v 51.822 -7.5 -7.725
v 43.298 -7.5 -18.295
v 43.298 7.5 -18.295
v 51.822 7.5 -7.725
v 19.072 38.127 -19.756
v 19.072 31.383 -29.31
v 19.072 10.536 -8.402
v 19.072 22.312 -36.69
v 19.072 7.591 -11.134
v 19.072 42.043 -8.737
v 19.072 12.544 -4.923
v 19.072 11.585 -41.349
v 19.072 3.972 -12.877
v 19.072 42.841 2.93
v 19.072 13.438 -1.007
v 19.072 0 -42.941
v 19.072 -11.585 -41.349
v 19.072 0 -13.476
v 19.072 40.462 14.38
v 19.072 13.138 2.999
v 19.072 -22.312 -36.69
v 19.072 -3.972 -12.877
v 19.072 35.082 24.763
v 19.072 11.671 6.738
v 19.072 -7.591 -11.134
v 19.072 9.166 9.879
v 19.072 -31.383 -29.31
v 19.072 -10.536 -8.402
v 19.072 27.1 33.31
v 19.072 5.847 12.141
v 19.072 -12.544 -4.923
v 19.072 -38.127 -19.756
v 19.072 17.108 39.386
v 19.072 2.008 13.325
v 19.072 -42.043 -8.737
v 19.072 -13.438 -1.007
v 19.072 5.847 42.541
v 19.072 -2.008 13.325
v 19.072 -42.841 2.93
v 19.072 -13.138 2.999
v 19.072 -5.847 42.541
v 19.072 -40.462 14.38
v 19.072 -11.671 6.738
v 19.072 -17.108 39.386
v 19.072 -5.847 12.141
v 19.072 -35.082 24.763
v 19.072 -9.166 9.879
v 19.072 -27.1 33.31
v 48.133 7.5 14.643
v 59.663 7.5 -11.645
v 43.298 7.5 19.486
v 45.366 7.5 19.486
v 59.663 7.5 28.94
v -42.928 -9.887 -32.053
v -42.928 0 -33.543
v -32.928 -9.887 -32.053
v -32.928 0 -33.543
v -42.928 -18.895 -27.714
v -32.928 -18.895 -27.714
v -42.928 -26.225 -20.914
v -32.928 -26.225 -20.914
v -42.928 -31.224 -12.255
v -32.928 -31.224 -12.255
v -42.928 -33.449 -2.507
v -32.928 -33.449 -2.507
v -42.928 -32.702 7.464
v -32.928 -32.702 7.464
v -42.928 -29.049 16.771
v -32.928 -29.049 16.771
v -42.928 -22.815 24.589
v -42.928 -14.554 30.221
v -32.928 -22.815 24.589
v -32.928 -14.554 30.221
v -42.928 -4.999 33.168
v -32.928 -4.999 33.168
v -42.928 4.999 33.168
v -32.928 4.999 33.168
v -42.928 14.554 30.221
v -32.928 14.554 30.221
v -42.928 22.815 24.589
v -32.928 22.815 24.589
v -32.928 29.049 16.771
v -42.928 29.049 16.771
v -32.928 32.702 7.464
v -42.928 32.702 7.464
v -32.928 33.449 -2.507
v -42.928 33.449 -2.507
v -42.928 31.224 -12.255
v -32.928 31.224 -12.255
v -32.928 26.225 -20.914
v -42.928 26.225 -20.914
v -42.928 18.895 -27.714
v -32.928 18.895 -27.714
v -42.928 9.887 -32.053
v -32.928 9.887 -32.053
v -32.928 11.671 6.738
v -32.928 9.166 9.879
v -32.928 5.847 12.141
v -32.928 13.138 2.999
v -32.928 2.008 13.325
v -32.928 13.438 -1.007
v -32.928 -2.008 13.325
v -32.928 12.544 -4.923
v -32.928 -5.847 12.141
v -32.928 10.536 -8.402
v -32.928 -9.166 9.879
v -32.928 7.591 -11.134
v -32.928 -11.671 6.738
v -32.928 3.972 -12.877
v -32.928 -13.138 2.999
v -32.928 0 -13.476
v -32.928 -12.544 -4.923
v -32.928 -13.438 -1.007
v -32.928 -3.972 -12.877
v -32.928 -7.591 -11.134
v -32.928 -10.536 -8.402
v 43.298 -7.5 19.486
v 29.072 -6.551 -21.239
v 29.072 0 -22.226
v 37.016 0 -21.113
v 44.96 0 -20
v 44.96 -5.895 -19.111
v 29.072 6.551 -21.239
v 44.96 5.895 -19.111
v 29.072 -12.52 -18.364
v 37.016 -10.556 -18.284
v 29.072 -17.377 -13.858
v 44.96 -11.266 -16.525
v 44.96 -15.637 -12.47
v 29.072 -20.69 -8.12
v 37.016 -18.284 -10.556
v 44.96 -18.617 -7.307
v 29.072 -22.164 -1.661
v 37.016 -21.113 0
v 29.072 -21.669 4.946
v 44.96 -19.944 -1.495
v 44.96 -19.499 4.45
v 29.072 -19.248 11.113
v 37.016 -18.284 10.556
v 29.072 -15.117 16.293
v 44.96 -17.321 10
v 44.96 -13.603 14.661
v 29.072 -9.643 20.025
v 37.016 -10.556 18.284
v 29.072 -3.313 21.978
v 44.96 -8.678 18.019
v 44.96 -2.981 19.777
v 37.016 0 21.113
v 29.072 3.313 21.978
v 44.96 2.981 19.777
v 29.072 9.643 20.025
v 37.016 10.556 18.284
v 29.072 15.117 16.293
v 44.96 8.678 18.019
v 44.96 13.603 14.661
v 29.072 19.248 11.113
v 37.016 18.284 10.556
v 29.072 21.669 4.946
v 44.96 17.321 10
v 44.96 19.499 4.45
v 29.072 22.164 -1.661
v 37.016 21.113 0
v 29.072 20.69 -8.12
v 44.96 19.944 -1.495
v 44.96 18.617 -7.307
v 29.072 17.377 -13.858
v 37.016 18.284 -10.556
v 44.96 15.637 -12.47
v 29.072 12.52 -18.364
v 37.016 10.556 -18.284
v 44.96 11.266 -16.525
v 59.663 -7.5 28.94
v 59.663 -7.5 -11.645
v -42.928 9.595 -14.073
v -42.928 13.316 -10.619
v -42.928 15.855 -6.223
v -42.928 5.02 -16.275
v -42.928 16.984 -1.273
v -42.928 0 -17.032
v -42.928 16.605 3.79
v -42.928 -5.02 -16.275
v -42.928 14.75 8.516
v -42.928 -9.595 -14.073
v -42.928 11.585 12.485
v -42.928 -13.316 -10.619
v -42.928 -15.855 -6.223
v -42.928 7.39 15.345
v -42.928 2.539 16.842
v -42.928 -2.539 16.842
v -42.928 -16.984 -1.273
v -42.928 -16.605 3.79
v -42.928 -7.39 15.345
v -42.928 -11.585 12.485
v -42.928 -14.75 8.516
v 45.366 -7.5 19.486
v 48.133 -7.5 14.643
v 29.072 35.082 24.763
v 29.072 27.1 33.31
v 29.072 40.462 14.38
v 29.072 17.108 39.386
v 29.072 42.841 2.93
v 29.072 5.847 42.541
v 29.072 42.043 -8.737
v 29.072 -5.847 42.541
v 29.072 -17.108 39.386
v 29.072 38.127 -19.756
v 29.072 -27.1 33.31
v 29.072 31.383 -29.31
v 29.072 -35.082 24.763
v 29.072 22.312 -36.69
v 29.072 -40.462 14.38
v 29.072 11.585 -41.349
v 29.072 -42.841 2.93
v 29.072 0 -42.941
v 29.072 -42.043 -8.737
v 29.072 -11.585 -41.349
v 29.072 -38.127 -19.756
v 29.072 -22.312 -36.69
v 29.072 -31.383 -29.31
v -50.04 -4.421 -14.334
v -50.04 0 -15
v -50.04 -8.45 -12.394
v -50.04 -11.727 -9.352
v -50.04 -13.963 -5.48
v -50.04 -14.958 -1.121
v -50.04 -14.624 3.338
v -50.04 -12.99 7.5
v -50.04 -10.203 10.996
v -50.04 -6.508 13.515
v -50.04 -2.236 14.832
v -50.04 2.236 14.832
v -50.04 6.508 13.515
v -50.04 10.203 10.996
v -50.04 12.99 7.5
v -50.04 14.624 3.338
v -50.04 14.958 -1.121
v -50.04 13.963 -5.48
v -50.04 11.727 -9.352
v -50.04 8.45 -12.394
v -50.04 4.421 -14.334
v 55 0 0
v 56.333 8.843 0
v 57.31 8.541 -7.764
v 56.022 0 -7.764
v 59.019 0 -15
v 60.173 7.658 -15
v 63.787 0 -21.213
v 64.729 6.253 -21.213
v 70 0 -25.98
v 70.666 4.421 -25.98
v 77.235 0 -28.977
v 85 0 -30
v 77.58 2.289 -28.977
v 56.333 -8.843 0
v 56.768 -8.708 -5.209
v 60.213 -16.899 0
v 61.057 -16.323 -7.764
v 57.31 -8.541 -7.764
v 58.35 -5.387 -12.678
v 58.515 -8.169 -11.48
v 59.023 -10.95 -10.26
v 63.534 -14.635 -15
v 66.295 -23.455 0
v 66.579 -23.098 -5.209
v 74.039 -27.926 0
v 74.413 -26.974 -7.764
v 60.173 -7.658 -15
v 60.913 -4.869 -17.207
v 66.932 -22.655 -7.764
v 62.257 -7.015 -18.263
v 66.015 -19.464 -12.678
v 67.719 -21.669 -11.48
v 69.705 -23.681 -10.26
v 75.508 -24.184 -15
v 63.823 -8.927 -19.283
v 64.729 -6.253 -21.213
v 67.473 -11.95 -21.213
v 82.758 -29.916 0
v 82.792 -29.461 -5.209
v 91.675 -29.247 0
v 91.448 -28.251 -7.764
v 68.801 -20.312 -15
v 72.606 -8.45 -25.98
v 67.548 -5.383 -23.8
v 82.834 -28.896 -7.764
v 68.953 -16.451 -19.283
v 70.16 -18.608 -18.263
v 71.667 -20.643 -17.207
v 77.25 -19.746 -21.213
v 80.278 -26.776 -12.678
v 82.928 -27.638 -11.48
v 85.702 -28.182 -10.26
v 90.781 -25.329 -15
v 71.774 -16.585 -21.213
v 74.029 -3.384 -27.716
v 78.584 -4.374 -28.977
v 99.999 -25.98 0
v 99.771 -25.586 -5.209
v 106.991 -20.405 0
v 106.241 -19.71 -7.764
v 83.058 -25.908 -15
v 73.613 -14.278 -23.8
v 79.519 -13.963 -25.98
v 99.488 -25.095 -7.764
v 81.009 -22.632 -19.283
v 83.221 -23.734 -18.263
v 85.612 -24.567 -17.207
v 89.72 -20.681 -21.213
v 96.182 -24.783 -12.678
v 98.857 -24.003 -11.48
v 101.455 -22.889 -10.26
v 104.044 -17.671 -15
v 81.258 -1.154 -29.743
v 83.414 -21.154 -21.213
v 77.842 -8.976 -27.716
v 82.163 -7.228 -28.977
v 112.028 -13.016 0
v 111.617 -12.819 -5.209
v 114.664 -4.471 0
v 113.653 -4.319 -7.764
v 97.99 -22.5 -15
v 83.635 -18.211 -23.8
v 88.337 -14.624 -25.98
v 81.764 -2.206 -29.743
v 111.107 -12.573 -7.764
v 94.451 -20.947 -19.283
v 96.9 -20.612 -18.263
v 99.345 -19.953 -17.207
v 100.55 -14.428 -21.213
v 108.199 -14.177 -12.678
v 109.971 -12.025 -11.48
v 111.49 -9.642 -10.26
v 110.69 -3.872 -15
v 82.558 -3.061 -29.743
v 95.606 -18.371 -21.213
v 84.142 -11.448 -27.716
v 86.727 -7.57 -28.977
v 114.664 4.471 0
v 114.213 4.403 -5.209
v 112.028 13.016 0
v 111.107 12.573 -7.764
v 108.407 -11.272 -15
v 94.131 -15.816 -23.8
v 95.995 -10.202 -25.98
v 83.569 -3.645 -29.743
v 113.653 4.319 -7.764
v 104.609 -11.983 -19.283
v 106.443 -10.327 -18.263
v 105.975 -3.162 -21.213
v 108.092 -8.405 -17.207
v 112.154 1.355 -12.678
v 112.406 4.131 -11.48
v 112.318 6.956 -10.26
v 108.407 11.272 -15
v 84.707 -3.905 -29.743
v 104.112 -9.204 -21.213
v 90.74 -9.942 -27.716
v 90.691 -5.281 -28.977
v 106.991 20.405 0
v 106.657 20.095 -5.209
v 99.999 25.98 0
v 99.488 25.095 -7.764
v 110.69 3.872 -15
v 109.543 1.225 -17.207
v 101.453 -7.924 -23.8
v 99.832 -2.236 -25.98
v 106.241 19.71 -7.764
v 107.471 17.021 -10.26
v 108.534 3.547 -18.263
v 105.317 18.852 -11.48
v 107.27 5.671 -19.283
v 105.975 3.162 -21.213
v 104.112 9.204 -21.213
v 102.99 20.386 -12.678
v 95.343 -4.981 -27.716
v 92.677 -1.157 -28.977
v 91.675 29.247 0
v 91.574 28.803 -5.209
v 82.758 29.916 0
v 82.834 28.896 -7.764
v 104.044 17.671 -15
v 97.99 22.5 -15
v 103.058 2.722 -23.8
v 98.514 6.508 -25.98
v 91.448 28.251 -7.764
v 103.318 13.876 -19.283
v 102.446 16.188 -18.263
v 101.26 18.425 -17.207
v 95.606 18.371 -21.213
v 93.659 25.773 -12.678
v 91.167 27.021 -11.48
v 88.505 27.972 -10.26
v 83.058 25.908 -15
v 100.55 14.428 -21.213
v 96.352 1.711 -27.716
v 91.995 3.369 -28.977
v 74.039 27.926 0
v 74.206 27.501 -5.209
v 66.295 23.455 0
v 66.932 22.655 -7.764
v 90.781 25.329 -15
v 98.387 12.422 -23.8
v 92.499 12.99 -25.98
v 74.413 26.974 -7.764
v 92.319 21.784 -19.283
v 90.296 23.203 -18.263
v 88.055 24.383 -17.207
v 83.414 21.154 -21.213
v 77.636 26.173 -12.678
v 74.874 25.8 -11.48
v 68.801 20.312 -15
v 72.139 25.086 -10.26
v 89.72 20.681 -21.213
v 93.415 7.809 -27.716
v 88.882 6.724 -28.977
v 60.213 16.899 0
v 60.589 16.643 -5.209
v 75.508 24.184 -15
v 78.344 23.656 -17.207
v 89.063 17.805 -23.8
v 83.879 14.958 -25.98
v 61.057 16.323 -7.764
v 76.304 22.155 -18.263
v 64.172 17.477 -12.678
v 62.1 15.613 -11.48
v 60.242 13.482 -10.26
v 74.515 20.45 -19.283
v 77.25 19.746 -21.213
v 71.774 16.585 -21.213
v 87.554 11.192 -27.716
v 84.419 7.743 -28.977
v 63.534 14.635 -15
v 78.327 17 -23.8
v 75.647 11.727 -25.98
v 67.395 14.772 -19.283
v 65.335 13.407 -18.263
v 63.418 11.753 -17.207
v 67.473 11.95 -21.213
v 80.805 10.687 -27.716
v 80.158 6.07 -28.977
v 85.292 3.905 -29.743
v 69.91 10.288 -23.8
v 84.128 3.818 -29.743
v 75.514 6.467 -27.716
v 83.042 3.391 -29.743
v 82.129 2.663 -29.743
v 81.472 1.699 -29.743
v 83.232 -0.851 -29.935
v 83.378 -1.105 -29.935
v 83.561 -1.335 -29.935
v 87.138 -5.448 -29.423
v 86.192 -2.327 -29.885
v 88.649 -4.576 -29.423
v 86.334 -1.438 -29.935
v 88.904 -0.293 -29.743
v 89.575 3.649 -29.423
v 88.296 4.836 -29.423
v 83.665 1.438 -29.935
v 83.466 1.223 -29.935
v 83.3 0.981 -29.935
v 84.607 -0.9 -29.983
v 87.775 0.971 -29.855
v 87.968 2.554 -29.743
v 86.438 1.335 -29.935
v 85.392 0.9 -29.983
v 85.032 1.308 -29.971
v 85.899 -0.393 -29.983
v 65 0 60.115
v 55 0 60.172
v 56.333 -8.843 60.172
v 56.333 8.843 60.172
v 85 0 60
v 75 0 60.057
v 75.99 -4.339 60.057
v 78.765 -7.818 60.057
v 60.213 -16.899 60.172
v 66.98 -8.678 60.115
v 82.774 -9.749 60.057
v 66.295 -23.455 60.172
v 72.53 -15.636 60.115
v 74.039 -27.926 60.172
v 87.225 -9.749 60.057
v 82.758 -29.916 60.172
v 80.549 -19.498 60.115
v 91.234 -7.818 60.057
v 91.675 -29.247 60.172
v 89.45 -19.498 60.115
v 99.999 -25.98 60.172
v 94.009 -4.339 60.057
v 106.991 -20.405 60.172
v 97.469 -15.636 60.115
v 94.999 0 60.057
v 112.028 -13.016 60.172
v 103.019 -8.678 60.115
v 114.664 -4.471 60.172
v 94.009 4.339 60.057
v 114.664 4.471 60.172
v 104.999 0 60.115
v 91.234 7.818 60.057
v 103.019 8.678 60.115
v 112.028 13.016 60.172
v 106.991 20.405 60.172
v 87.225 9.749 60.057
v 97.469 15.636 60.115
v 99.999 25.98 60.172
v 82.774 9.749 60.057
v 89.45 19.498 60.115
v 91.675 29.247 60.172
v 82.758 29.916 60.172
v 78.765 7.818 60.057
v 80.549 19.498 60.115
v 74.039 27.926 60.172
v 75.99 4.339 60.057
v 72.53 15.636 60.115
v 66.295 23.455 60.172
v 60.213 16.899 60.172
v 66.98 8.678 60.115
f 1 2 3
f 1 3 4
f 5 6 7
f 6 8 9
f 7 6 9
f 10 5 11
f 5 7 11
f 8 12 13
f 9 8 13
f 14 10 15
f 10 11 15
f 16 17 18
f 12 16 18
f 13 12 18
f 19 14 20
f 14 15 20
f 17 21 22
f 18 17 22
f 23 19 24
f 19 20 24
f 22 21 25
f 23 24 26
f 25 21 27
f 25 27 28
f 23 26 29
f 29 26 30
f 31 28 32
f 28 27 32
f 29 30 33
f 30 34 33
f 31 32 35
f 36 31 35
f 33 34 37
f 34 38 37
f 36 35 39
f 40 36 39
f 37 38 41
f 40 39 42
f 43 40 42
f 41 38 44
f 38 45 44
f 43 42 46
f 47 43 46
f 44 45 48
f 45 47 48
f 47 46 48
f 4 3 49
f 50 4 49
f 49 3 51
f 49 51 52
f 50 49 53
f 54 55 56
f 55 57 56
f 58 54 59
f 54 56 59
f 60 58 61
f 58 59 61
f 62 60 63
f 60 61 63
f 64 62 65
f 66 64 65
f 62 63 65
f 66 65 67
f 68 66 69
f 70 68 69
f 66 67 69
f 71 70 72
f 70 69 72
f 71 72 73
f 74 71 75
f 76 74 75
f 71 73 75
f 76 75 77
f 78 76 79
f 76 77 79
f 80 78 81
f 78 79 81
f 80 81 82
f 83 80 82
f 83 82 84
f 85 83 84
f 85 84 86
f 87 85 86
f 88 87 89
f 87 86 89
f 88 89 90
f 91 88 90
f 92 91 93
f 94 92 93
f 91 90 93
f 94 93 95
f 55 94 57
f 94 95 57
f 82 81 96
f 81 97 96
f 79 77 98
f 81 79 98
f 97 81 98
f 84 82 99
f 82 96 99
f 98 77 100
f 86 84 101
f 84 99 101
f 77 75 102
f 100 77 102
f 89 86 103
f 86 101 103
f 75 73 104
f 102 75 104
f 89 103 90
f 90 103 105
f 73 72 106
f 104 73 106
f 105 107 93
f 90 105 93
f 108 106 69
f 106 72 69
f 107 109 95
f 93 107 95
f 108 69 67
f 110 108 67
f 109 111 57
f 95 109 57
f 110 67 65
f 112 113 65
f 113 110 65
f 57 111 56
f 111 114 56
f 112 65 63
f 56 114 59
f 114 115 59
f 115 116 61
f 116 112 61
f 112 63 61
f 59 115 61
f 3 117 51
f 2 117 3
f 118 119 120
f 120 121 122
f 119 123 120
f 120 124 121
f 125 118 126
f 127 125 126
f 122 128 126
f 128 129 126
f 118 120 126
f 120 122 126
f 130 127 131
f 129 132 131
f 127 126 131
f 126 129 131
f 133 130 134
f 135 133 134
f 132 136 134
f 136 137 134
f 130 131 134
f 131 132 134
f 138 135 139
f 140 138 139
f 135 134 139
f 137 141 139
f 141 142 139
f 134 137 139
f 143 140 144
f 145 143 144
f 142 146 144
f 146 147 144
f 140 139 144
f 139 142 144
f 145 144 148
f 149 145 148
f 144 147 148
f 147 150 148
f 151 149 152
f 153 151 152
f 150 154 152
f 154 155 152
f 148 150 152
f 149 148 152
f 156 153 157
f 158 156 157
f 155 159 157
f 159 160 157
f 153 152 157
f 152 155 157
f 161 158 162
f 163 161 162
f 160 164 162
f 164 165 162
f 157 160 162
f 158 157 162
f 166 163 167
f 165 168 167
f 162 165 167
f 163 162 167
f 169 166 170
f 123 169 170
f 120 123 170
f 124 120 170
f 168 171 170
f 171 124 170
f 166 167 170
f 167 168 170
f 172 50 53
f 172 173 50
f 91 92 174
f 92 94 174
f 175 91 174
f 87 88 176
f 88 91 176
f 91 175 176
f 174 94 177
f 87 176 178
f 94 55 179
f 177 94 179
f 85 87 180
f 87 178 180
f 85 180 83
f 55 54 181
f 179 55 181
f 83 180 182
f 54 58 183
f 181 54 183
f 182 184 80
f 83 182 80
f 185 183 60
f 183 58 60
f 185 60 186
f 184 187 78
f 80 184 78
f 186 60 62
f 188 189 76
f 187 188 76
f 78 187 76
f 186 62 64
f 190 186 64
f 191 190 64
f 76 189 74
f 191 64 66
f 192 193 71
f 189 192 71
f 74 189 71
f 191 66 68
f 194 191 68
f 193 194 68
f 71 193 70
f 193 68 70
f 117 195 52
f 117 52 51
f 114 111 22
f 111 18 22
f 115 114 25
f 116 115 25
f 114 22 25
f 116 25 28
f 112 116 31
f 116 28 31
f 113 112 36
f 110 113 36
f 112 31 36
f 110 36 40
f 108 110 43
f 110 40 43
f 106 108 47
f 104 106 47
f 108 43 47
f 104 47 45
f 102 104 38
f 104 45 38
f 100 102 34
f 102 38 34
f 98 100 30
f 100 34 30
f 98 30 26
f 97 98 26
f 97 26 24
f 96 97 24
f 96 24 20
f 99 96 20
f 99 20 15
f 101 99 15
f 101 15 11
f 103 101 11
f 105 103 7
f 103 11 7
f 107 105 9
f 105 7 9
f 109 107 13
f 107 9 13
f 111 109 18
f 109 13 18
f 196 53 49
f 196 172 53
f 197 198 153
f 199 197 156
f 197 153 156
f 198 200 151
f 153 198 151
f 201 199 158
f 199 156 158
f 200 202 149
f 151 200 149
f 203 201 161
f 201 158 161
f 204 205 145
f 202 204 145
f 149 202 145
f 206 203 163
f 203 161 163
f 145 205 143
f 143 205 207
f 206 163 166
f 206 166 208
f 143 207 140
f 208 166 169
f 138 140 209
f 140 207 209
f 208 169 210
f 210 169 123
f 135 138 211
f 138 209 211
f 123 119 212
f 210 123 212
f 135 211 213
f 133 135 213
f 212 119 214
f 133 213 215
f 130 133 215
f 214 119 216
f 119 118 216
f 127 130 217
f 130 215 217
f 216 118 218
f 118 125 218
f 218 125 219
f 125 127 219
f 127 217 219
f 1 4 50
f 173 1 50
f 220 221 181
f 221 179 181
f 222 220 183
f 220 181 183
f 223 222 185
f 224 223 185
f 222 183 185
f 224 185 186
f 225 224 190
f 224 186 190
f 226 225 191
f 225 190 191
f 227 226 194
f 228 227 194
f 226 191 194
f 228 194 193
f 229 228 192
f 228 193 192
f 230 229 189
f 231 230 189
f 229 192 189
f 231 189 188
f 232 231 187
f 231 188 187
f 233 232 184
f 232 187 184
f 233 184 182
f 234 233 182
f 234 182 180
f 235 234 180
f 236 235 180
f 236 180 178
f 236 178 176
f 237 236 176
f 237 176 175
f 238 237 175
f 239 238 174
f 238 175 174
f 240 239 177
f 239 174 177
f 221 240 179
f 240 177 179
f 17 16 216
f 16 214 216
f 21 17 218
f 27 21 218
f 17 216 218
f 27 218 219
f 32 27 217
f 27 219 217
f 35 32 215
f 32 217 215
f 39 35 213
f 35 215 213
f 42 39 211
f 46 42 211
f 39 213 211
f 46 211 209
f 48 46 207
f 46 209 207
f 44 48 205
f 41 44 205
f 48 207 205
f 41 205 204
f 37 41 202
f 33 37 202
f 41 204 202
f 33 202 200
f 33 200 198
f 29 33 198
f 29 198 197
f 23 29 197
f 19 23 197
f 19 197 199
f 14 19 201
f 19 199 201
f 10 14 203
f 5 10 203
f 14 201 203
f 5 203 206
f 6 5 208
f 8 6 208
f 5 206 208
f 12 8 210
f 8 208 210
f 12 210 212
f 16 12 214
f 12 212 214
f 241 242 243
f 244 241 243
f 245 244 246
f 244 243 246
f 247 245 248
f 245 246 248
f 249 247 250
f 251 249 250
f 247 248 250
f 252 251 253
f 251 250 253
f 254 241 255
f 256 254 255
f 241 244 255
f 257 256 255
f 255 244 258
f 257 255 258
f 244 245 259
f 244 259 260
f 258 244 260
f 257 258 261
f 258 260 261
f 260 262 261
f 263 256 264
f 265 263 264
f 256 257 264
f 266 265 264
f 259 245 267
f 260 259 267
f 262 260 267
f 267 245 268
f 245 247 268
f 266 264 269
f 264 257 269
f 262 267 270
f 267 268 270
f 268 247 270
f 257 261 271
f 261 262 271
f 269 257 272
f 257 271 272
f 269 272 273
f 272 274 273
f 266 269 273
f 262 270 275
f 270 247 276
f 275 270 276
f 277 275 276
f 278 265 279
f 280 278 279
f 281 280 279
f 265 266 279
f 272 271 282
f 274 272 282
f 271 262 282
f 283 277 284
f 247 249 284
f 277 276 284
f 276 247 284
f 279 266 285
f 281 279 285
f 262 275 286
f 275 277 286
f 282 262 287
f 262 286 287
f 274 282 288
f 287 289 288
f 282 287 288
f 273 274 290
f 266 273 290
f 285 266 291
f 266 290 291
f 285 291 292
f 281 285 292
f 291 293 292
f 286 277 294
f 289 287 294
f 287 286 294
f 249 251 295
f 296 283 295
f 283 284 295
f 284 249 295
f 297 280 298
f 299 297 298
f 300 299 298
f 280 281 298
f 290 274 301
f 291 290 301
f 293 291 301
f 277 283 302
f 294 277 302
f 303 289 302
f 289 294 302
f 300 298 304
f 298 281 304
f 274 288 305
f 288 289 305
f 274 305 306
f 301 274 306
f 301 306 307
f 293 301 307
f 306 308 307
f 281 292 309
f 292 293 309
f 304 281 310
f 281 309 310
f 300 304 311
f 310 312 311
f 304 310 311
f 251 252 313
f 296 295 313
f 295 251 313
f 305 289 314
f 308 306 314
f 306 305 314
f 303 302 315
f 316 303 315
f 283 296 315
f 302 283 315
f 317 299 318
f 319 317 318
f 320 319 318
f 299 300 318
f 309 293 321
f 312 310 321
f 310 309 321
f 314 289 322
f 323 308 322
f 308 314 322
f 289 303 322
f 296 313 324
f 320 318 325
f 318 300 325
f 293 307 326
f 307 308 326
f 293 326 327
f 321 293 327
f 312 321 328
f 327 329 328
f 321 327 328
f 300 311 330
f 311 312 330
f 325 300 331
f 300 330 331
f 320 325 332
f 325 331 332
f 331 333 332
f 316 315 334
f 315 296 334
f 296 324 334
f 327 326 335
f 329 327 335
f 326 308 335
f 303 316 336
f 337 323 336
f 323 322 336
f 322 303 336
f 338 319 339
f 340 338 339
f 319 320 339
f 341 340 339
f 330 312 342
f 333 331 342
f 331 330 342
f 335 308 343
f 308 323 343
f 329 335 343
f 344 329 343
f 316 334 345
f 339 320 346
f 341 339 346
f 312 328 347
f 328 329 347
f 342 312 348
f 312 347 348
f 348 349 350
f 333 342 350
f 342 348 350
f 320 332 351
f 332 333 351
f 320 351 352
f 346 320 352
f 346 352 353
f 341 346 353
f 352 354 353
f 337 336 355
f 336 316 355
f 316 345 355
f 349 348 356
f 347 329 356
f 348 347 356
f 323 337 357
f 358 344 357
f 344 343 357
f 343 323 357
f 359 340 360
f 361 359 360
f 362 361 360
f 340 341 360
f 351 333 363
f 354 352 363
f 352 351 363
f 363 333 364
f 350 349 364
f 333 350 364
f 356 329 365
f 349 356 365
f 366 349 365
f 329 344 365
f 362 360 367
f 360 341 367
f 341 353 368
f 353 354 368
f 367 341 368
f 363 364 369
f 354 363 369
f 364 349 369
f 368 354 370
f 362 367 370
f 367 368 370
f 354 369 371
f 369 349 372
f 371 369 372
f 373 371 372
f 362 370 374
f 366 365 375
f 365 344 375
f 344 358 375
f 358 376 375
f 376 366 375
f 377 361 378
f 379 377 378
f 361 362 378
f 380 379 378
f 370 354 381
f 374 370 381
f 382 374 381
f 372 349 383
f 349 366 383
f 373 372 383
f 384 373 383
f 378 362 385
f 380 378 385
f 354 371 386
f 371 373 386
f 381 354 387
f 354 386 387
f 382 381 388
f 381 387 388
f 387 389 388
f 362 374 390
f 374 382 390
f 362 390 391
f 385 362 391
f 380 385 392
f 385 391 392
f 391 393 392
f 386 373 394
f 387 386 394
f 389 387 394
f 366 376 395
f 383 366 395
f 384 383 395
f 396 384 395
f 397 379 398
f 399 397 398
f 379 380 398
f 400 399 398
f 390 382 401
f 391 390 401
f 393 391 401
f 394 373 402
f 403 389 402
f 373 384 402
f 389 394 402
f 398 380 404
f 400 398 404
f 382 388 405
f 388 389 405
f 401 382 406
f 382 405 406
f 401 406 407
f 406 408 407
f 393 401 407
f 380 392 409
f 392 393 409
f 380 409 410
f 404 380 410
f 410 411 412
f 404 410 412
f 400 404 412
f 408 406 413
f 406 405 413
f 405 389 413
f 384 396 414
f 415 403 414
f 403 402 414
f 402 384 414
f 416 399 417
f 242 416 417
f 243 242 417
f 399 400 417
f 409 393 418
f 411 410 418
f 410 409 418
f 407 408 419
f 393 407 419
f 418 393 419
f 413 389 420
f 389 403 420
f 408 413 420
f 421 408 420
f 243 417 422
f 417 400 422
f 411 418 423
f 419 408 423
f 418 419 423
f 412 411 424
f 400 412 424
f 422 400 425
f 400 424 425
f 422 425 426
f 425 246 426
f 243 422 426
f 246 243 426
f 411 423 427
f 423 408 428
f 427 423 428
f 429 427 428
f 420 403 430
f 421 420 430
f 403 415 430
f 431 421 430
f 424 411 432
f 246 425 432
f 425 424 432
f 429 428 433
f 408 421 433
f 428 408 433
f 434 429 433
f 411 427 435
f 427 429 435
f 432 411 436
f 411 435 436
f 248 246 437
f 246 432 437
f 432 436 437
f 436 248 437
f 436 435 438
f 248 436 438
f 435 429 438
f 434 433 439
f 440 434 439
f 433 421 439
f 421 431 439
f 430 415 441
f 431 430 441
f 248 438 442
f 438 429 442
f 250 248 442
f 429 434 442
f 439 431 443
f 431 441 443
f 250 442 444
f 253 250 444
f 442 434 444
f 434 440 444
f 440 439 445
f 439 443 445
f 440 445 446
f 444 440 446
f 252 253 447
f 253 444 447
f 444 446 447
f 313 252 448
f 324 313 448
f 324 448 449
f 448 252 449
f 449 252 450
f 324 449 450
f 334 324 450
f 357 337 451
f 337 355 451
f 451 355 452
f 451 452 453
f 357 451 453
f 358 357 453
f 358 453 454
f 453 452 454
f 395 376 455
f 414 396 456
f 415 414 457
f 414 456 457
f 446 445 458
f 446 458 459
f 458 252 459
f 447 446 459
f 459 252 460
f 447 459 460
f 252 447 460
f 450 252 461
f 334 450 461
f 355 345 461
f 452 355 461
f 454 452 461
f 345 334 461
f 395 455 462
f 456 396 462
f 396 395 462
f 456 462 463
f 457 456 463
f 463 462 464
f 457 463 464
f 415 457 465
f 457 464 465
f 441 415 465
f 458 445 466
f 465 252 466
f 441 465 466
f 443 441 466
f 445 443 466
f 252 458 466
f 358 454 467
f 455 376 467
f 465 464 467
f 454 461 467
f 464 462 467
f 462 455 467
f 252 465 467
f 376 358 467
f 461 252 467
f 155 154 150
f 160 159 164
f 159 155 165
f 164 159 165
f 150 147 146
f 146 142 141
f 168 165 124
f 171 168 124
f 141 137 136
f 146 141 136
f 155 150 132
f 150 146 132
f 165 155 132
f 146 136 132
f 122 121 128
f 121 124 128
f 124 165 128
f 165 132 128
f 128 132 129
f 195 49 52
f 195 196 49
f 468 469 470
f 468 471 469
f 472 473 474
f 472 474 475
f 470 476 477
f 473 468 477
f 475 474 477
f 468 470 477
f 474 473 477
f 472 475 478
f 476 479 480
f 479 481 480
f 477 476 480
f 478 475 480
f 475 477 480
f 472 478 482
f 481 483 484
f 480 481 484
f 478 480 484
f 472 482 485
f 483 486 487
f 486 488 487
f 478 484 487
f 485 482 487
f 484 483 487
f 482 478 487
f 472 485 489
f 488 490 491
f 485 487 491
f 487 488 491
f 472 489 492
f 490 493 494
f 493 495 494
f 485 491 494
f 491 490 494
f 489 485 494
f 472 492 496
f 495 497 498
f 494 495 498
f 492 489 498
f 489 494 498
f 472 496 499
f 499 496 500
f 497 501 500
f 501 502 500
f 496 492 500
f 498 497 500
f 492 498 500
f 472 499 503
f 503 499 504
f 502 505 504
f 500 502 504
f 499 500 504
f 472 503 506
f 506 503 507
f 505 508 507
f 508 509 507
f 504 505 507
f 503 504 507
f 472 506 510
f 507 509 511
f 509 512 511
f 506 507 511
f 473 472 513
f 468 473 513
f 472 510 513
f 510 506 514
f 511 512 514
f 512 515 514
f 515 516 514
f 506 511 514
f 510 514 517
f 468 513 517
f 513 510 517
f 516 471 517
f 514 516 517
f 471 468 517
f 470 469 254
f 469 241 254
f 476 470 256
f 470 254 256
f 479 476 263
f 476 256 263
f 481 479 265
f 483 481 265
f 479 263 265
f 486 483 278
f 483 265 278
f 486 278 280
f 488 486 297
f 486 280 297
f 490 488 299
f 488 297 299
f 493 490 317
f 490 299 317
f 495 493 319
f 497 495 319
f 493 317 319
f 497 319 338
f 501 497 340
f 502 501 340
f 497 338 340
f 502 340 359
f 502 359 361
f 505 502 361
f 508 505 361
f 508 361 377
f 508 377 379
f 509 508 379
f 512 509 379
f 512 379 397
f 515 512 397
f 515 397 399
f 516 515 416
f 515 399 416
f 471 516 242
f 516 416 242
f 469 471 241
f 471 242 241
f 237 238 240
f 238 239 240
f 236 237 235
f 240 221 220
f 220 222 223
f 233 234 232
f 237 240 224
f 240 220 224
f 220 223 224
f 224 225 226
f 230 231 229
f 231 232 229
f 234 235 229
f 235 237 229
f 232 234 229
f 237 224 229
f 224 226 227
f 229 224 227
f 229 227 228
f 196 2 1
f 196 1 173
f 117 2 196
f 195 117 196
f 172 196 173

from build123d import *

# Parameters (mm, degrees)
F5_DEPTH = 7.5


with BuildPart() as f1:
    # F0 (on Front) → F1 (revolve)
    with BuildSketch(Plane.XZ):
        Polygon((44.959891, 0), (-50.040109, 0), (-50.040109, -15), (-42.927807, -17.032085), (-42.927807, -33.542781), (-32.927807, -33.542781), (-32.927807, -13.475936), (19.072193, -13.475936), (19.072193, -42.941179), (29.072193, -42.941179), (29.072193, -22.225936), (44.959891, -20), align=None)
    revolve(axis=Axis((-2.540109, 0, 0), (-1, 0, 0)))


with BuildPart() as f3:
    # F2 (on Front) → F3 (revolve)
    with BuildSketch(Plane.XZ):
        with BuildLine():
            Line((84.999505, 60), (55, 60.172413))
            Line((55, 60.172413), (55, 0))
            ThreePointArc((55, 0), (63.786651, -21.212853), (84.999505, -29.999505))
            Line((84.999505, -29.999505), (84.999505, 60))
        make_face()
    revolve(axis=Axis((84.999505, 0, 15), (0, 0, 1)))


with BuildPart() as f5:
    # F4 (on Front) → F5 (new body, symmetric)
    with BuildSketch(Plane.XZ):
        Polygon((48.13274, 14.643121), (45.365538, 19.485727), (43.298421, 19.485727), (43.298421, -18.294775), (51.822346, -7.725109), (59.662756, -11.645314), (59.662756, 28.940339), align=None)
    extrude(amount=F5_DEPTH, both=True)


solid = Compound([f1.part, f3.part, f5.part])
